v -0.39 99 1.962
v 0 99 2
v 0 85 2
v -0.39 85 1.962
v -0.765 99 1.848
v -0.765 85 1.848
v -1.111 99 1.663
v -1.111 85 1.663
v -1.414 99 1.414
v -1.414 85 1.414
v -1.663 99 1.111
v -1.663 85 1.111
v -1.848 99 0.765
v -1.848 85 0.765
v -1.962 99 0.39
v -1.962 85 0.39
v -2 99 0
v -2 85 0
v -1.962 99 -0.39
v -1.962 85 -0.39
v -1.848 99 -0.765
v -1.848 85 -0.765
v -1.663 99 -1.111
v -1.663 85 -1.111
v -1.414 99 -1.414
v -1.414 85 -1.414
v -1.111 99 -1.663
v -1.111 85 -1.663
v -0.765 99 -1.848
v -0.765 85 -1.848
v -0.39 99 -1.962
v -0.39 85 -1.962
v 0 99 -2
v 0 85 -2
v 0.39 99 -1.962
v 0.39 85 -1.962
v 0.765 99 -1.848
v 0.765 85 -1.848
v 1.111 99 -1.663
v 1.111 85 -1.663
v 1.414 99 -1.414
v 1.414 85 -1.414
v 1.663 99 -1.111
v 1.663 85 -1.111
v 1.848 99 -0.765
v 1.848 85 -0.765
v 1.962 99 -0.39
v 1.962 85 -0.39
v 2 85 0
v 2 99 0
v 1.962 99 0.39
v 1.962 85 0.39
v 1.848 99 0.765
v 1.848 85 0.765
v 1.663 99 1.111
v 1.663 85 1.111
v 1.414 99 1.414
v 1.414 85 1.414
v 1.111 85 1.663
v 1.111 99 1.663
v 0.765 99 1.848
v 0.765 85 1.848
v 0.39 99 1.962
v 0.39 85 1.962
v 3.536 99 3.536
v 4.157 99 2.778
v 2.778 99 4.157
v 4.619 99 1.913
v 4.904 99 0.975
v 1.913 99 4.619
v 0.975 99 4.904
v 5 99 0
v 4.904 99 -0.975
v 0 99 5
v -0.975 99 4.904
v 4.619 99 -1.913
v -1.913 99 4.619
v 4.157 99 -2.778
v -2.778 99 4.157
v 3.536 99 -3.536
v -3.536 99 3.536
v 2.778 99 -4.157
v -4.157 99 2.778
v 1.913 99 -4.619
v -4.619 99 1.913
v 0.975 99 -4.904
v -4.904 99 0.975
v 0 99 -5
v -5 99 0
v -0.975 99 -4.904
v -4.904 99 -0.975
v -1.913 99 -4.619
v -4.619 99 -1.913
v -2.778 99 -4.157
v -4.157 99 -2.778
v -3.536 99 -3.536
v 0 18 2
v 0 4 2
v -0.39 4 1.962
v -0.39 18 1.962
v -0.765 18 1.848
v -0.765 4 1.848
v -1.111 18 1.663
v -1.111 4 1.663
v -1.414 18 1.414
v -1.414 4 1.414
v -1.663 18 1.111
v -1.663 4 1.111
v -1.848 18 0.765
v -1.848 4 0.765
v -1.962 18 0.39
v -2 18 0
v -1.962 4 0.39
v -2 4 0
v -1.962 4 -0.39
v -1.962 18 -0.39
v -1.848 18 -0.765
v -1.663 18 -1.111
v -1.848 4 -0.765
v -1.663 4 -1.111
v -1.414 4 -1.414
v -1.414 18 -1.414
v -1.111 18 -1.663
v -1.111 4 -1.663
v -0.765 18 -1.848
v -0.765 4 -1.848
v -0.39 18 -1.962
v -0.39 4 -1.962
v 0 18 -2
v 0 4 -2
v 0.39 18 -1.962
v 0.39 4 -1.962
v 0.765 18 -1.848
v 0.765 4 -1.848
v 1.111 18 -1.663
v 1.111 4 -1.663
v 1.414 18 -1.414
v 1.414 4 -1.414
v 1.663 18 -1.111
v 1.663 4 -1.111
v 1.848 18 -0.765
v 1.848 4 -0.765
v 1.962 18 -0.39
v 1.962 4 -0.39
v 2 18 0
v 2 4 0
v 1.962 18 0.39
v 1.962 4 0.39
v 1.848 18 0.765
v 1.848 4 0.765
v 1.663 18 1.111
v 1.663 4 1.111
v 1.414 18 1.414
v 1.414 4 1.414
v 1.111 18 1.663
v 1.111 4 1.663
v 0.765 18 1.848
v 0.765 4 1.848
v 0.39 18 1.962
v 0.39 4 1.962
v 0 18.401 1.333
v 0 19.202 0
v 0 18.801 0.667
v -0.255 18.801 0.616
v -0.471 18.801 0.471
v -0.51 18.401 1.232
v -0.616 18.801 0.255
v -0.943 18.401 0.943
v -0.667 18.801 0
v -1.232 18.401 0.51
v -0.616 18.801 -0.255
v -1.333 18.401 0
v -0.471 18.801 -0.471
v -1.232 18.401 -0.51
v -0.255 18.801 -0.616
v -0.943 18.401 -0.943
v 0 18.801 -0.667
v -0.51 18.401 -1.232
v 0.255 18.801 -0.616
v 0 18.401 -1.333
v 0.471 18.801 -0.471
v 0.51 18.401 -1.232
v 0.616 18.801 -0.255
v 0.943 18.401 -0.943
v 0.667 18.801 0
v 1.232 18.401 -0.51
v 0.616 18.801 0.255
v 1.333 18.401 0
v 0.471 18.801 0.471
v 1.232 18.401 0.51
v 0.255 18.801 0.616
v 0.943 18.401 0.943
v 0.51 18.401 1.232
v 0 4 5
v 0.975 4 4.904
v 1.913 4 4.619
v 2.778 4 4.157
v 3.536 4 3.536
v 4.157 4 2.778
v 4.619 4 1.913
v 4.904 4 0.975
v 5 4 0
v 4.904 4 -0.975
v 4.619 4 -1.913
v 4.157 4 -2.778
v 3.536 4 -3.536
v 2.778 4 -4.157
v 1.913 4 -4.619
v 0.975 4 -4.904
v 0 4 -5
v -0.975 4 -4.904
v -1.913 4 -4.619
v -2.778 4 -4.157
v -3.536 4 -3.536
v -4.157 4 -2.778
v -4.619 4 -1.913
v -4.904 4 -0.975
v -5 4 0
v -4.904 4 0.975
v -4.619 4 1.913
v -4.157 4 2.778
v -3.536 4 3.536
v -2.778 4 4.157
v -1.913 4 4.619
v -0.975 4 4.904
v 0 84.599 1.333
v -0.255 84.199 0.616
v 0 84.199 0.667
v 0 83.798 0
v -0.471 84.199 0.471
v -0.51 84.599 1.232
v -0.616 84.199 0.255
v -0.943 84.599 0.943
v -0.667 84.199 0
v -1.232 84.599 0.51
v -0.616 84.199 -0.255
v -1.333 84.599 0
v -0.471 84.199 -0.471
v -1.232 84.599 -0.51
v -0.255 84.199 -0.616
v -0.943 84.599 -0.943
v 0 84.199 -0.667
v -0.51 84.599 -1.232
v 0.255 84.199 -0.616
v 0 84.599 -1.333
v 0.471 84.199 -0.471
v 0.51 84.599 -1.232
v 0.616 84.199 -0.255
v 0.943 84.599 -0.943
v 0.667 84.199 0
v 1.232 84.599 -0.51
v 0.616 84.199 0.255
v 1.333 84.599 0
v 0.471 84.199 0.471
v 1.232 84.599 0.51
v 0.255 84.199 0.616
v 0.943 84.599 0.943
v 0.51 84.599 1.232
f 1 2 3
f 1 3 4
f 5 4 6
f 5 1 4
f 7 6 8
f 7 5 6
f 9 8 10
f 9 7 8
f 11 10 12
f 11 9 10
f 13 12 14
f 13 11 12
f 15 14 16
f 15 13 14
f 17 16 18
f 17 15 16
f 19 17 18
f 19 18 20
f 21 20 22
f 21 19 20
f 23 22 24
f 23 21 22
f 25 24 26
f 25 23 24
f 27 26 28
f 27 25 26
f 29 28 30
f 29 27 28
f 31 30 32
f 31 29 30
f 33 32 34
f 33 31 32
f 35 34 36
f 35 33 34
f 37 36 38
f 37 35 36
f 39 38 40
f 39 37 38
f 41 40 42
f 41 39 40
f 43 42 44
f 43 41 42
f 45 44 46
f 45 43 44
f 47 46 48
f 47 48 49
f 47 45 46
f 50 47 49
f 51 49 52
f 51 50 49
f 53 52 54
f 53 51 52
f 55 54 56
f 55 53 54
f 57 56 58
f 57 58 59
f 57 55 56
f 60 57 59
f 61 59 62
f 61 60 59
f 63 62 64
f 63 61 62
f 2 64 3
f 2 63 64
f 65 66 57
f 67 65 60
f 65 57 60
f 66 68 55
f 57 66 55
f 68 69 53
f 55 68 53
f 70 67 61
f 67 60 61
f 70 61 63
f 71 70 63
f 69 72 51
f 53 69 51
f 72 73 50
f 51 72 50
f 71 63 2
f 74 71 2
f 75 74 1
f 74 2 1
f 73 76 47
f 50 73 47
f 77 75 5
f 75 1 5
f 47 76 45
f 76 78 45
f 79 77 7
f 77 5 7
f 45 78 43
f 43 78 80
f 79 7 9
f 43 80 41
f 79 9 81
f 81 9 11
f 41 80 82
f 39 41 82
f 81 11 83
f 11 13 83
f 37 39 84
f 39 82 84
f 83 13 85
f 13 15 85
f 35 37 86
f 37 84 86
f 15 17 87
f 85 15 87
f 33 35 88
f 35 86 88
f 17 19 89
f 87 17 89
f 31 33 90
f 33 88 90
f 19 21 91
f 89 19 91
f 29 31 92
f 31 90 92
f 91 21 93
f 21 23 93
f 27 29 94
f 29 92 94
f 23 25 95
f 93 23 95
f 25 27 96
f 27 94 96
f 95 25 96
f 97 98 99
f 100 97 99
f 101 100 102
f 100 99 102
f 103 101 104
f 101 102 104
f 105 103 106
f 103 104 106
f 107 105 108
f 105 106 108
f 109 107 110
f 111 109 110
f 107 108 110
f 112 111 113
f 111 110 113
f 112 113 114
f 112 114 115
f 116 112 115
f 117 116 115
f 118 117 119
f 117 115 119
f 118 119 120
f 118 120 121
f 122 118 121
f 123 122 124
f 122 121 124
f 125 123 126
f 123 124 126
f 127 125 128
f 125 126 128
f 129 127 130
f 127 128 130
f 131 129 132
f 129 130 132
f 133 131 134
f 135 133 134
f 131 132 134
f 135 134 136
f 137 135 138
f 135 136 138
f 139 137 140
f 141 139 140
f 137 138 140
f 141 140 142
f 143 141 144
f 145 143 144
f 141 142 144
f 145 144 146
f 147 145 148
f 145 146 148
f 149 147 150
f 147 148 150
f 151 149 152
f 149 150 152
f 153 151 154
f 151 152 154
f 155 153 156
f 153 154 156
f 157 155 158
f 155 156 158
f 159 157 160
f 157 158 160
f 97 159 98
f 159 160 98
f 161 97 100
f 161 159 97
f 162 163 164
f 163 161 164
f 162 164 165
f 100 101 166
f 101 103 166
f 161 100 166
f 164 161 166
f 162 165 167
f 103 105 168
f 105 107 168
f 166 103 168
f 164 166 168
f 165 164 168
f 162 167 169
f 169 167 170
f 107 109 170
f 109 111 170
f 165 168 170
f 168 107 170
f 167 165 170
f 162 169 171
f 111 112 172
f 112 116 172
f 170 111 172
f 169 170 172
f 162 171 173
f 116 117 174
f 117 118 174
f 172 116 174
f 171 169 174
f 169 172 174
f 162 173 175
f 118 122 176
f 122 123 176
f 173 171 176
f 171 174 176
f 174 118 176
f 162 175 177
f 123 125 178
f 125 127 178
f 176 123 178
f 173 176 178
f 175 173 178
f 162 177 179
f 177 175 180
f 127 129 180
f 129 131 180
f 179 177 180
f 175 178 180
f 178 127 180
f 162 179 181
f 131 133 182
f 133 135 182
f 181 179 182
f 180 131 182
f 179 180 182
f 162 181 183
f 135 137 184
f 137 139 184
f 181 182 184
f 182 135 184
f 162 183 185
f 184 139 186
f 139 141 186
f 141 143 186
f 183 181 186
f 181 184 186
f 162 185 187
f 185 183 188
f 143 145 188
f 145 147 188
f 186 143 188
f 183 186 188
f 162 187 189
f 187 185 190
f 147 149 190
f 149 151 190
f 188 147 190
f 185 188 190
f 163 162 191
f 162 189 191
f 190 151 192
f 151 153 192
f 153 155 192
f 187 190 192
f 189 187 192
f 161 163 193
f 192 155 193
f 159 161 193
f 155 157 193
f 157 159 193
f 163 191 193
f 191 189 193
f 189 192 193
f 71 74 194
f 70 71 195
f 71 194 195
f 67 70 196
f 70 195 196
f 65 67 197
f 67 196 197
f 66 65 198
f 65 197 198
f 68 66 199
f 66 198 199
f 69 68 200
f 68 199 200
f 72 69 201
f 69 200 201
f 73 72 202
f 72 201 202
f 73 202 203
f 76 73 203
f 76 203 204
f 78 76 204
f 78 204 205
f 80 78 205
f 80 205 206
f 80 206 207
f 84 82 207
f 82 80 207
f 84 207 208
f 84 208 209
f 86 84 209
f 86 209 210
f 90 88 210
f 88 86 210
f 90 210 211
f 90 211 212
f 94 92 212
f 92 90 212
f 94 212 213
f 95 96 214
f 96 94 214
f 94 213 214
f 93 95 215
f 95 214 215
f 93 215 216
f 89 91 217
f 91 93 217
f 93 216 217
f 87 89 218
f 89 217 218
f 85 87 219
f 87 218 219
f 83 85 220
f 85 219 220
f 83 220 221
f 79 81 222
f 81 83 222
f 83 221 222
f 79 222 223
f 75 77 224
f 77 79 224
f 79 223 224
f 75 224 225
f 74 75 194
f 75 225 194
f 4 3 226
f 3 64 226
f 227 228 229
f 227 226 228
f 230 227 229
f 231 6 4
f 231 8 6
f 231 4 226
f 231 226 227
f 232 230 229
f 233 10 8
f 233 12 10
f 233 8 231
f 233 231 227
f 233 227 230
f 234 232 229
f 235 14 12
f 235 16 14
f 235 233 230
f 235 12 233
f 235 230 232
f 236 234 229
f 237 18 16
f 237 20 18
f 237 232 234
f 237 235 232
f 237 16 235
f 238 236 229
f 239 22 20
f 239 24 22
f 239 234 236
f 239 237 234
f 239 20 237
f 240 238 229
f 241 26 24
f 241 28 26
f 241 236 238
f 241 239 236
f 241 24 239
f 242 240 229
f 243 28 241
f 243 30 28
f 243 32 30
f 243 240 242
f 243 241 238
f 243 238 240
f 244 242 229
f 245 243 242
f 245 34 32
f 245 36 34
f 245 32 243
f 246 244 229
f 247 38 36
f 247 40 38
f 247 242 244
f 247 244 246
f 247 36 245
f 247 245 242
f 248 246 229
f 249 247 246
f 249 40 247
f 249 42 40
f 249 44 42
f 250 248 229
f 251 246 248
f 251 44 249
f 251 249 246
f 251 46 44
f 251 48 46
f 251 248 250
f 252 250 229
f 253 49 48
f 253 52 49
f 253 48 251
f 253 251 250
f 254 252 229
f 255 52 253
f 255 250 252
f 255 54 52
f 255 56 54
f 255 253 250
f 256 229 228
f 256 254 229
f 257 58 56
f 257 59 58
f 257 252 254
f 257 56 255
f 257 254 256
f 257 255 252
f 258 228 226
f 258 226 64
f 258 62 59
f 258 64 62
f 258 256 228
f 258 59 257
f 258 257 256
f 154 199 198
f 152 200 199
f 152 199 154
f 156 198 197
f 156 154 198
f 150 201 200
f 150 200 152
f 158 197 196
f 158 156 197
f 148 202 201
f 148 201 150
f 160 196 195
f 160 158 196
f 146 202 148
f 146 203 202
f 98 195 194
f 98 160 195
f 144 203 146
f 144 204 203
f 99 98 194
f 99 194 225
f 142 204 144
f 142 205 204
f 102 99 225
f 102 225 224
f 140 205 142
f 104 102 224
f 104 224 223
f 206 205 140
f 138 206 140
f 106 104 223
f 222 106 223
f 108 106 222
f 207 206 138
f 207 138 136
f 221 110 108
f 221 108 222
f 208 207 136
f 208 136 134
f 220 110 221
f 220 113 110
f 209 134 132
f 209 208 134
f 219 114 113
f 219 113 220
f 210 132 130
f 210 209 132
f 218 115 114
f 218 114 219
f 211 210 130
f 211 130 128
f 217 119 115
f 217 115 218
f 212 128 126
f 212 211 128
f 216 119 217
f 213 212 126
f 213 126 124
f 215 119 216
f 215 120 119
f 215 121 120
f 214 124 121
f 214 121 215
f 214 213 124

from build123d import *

# Parameters (mm, degrees)
SKETCH1_R           = 5
BOSS_EXTRUDE1_DEPTH = 103
SKETCH5_W           = 1
SKETCH5_H           = 4
SKETCH6_R           = 5
CUT_EXTRUDE1_DEPTH  = 20


with BuildPart() as part:
    # Sketch1 → Boss-Extrude1 (new body)
    with BuildSketch(Plane(origin=(0, 0, 0), x_dir=(1, 0, 0), z_dir=(0, 1, 0))):
        with Locations(Location((0, 0, 0), (0, 0, 270))):
            Circle(SKETCH1_R)
    extrude(amount=BOSS_EXTRUDE1_DEPTH)

    # Sketch4 → Ø4.0mm Dowel Hole1 (revolve, cut)
    with BuildSketch(Plane(origin=(0, 103, 0), x_dir=(0, 0, 1), z_dir=(1, 0, 0))):
        Polygon((0, 0), (0, 19.201721238), (2, 18), (2, 0.025), (2.025, 0), align=None)
    f_4_0mm_dowel_hole1 = revolve(axis=Axis((0, 109.35, 0), (0, -1, 0)), mode=Mode.SUBTRACT)

    # Mirror1: Ø4.0mm Dowel Hole1 across plane
    add(f_4_0mm_dowel_hole1.mirror(Plane.ZX.offset(51.5)), mode=Mode.SUBTRACT)

    # Sketch5 → Cut-Revolve2 (revolve, cut)
    with BuildSketch(Plane.XY):
        with Locations((-4.5, 101)):
            Rectangle(SKETCH5_W, SKETCH5_H)
        with Locations((-4.5, 2)):
            Rectangle(SKETCH5_W, SKETCH5_H)
    revolve(axis=Axis((0, 103, 0), (0, -1, 0)), mode=Mode.SUBTRACT)

    # Sketch6 → Cut-Extrude1 (cut)
    with BuildSketch(Plane(origin=(0, 99, 0), x_dir=(1, 0, 0), z_dir=(0, 1, 0))):
        with Locations(Location((0, 0, 0), (0, 0, 180))):
            Circle(SKETCH6_R)
    cut_extrude1 = extrude(amount=CUT_EXTRUDE1_DEPTH, mode=Mode.SUBTRACT)

    # Mirror3: Cut-Extrude1 across plane
    add(cut_extrude1.mirror(Plane.ZX.offset(51.5)), mode=Mode.SUBTRACT)


solid = part.part
